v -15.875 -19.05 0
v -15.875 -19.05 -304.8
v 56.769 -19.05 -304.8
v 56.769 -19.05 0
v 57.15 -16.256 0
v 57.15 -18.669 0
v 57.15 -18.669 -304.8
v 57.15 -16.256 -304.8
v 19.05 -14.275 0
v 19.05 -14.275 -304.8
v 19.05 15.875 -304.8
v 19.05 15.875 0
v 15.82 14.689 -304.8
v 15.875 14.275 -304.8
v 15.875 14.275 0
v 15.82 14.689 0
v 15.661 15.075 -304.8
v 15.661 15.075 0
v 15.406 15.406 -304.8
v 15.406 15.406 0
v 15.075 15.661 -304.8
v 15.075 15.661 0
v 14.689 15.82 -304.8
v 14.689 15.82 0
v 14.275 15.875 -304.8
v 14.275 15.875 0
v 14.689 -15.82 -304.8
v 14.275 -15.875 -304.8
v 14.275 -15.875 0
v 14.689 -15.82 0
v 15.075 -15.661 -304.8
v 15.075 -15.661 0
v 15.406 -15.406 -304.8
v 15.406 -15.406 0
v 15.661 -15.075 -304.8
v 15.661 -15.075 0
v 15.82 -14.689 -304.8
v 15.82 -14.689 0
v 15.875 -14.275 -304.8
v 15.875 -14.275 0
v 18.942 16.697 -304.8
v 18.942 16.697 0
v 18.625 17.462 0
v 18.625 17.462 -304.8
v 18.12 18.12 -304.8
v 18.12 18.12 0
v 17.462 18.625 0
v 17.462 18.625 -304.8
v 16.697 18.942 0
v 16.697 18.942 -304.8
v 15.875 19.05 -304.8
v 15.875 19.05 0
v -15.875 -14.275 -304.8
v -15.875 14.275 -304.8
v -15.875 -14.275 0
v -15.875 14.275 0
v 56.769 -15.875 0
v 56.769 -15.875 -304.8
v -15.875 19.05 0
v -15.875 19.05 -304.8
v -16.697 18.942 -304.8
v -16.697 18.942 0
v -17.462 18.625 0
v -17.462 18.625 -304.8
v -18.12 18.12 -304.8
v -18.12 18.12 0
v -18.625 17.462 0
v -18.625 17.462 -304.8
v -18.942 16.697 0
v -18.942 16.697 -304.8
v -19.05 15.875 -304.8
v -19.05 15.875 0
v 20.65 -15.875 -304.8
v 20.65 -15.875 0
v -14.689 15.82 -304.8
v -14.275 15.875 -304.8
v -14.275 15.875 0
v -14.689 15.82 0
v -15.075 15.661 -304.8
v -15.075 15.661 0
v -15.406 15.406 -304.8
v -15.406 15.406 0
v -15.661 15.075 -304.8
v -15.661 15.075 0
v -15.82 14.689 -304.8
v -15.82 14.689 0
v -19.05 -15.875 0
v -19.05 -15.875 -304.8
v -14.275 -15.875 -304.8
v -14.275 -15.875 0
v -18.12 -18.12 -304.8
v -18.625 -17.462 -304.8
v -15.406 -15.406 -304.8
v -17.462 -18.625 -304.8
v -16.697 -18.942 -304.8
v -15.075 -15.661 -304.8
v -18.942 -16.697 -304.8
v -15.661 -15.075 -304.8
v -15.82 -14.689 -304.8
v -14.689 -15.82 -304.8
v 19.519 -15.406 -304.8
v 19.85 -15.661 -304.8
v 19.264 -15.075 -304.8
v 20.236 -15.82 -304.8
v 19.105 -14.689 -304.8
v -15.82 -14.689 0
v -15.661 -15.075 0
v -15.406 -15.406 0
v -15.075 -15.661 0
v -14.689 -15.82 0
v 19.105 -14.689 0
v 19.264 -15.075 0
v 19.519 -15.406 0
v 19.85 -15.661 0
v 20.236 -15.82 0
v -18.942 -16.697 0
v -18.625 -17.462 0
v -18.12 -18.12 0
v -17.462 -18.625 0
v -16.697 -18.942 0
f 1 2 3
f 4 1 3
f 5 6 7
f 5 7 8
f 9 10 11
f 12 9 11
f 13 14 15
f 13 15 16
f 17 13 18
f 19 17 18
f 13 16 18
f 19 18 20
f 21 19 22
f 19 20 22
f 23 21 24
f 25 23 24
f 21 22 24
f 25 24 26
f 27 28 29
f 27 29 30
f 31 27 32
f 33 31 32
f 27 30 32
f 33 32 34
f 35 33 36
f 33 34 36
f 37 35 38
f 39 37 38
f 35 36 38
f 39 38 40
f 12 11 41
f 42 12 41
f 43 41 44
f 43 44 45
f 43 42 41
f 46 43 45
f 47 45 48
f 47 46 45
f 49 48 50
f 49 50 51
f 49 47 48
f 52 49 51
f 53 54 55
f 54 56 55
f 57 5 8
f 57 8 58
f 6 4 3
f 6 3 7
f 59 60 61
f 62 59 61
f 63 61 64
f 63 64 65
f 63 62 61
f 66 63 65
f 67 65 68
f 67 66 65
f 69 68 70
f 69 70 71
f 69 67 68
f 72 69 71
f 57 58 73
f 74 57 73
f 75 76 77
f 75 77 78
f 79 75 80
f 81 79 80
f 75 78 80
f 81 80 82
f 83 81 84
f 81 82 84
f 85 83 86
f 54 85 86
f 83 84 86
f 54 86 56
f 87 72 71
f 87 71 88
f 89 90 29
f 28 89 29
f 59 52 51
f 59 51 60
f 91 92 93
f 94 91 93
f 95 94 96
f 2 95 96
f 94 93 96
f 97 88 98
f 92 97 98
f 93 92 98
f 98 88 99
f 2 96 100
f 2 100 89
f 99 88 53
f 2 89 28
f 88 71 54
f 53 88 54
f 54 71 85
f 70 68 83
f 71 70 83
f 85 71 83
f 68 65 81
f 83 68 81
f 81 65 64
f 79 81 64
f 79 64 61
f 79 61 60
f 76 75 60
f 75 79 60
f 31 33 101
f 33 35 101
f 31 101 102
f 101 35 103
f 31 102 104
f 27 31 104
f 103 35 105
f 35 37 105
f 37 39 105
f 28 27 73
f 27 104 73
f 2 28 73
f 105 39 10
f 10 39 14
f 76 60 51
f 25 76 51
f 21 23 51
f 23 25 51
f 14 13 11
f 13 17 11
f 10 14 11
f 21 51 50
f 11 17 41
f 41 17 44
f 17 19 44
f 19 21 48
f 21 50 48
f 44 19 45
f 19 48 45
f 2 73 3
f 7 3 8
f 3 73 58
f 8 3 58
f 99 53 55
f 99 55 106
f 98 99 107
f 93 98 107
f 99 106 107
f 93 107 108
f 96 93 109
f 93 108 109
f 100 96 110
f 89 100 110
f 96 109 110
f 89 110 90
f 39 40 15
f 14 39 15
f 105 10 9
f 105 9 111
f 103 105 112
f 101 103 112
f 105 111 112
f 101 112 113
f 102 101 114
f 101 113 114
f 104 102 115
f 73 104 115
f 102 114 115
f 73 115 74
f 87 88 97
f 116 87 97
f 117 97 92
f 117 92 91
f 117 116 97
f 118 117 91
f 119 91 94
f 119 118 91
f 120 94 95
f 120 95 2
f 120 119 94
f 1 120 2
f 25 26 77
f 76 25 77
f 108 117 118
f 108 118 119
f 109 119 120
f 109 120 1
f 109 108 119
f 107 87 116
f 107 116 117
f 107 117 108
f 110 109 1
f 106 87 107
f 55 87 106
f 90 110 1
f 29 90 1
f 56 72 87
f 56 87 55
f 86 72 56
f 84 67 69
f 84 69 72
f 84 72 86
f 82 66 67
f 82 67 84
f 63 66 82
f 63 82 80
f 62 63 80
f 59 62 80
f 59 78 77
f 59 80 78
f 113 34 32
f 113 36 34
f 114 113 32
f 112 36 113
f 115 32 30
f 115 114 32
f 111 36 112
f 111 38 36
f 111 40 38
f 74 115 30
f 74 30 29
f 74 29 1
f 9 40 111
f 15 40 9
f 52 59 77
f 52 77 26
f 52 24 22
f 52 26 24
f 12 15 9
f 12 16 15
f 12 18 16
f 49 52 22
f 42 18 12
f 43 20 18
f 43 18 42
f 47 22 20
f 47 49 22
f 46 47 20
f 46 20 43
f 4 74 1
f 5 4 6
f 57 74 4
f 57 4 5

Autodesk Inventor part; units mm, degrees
ref_plane "YZ Plane" through (0, 0, 0) normal (1, 0, 0) x (0, 1, 0)
ref_plane "XZ Plane" through (0, 0, 0) normal (0, 1, 0) x (-1, 0, 0)
ref_plane "XY Plane" through (0, 0, 0) normal (0, 0, 1) x (1, 0, 0)
sketch "Sketch1" plane through (0, 0, 0) normal (0, 0, 1) x (1, 0, 0)
  arc A0 (14.2748, -15.875) -> (15.875, -14.2748) centre (14.2748, -14.2748) ccw
  line L0 (15.875, -14.2748) -> (15.875, 14.2748)
  arc A1 (15.875, 14.2748) -> (14.2748, 15.875) centre (14.2748, 14.2748) ccw
  arc A2 (-14.2748, 15.875) -> (-15.875, 14.2748) centre (-14.2748, 14.2748) ccw
  line L1 (-15.875, 14.2748) -> (-15.875, -14.2748)
  arc A3 (-15.875, -14.2748) -> (-14.2748, -15.875) centre (-14.2748, -14.2748) ccw
  line L2 (-14.2748, -15.875) -> (14.2748, -15.875)
  line L3 (14.2748, 15.875) -> (-14.2748, 15.875)
  line L4 (-15.875, -19.05) -> (56.769, -19.05)
  line L5 (56.769, -19.05) -> (57.15, -18.669)
  line L6 (57.15, -18.669) -> (57.15, -16.256)
  line L7 (57.15, -16.256) -> (56.769, -15.875)
  line L8 (56.769, -15.875) -> (20.6502, -15.875)
  arc A4 (19.05, -14.2748) -> (20.6502, -15.875) centre (20.6502, -14.2748) ccw
  line L9 (19.05, -14.2748) -> (19.05, 15.875)
  arc A5 (19.05, 15.875) -> (15.875, 19.05) centre (15.875, 15.875) ccw
  line L10 (15.875, 19.05) -> (-15.875, 19.05)
  arc A6 (-15.875, 19.05) -> (-19.05, 15.875) centre (-15.875, 15.875) ccw
  line L11 (-19.05, 15.875) -> (-19.05, -15.875)
  arc A7 (-19.05, -15.875) -> (-15.875, -19.05) centre (-15.875, -15.875) ccw
  point P0 (0, 0)
extrude "Extrusion1" add sketch "Sketch1" against normal blind 304.8
properties part number "9705"
